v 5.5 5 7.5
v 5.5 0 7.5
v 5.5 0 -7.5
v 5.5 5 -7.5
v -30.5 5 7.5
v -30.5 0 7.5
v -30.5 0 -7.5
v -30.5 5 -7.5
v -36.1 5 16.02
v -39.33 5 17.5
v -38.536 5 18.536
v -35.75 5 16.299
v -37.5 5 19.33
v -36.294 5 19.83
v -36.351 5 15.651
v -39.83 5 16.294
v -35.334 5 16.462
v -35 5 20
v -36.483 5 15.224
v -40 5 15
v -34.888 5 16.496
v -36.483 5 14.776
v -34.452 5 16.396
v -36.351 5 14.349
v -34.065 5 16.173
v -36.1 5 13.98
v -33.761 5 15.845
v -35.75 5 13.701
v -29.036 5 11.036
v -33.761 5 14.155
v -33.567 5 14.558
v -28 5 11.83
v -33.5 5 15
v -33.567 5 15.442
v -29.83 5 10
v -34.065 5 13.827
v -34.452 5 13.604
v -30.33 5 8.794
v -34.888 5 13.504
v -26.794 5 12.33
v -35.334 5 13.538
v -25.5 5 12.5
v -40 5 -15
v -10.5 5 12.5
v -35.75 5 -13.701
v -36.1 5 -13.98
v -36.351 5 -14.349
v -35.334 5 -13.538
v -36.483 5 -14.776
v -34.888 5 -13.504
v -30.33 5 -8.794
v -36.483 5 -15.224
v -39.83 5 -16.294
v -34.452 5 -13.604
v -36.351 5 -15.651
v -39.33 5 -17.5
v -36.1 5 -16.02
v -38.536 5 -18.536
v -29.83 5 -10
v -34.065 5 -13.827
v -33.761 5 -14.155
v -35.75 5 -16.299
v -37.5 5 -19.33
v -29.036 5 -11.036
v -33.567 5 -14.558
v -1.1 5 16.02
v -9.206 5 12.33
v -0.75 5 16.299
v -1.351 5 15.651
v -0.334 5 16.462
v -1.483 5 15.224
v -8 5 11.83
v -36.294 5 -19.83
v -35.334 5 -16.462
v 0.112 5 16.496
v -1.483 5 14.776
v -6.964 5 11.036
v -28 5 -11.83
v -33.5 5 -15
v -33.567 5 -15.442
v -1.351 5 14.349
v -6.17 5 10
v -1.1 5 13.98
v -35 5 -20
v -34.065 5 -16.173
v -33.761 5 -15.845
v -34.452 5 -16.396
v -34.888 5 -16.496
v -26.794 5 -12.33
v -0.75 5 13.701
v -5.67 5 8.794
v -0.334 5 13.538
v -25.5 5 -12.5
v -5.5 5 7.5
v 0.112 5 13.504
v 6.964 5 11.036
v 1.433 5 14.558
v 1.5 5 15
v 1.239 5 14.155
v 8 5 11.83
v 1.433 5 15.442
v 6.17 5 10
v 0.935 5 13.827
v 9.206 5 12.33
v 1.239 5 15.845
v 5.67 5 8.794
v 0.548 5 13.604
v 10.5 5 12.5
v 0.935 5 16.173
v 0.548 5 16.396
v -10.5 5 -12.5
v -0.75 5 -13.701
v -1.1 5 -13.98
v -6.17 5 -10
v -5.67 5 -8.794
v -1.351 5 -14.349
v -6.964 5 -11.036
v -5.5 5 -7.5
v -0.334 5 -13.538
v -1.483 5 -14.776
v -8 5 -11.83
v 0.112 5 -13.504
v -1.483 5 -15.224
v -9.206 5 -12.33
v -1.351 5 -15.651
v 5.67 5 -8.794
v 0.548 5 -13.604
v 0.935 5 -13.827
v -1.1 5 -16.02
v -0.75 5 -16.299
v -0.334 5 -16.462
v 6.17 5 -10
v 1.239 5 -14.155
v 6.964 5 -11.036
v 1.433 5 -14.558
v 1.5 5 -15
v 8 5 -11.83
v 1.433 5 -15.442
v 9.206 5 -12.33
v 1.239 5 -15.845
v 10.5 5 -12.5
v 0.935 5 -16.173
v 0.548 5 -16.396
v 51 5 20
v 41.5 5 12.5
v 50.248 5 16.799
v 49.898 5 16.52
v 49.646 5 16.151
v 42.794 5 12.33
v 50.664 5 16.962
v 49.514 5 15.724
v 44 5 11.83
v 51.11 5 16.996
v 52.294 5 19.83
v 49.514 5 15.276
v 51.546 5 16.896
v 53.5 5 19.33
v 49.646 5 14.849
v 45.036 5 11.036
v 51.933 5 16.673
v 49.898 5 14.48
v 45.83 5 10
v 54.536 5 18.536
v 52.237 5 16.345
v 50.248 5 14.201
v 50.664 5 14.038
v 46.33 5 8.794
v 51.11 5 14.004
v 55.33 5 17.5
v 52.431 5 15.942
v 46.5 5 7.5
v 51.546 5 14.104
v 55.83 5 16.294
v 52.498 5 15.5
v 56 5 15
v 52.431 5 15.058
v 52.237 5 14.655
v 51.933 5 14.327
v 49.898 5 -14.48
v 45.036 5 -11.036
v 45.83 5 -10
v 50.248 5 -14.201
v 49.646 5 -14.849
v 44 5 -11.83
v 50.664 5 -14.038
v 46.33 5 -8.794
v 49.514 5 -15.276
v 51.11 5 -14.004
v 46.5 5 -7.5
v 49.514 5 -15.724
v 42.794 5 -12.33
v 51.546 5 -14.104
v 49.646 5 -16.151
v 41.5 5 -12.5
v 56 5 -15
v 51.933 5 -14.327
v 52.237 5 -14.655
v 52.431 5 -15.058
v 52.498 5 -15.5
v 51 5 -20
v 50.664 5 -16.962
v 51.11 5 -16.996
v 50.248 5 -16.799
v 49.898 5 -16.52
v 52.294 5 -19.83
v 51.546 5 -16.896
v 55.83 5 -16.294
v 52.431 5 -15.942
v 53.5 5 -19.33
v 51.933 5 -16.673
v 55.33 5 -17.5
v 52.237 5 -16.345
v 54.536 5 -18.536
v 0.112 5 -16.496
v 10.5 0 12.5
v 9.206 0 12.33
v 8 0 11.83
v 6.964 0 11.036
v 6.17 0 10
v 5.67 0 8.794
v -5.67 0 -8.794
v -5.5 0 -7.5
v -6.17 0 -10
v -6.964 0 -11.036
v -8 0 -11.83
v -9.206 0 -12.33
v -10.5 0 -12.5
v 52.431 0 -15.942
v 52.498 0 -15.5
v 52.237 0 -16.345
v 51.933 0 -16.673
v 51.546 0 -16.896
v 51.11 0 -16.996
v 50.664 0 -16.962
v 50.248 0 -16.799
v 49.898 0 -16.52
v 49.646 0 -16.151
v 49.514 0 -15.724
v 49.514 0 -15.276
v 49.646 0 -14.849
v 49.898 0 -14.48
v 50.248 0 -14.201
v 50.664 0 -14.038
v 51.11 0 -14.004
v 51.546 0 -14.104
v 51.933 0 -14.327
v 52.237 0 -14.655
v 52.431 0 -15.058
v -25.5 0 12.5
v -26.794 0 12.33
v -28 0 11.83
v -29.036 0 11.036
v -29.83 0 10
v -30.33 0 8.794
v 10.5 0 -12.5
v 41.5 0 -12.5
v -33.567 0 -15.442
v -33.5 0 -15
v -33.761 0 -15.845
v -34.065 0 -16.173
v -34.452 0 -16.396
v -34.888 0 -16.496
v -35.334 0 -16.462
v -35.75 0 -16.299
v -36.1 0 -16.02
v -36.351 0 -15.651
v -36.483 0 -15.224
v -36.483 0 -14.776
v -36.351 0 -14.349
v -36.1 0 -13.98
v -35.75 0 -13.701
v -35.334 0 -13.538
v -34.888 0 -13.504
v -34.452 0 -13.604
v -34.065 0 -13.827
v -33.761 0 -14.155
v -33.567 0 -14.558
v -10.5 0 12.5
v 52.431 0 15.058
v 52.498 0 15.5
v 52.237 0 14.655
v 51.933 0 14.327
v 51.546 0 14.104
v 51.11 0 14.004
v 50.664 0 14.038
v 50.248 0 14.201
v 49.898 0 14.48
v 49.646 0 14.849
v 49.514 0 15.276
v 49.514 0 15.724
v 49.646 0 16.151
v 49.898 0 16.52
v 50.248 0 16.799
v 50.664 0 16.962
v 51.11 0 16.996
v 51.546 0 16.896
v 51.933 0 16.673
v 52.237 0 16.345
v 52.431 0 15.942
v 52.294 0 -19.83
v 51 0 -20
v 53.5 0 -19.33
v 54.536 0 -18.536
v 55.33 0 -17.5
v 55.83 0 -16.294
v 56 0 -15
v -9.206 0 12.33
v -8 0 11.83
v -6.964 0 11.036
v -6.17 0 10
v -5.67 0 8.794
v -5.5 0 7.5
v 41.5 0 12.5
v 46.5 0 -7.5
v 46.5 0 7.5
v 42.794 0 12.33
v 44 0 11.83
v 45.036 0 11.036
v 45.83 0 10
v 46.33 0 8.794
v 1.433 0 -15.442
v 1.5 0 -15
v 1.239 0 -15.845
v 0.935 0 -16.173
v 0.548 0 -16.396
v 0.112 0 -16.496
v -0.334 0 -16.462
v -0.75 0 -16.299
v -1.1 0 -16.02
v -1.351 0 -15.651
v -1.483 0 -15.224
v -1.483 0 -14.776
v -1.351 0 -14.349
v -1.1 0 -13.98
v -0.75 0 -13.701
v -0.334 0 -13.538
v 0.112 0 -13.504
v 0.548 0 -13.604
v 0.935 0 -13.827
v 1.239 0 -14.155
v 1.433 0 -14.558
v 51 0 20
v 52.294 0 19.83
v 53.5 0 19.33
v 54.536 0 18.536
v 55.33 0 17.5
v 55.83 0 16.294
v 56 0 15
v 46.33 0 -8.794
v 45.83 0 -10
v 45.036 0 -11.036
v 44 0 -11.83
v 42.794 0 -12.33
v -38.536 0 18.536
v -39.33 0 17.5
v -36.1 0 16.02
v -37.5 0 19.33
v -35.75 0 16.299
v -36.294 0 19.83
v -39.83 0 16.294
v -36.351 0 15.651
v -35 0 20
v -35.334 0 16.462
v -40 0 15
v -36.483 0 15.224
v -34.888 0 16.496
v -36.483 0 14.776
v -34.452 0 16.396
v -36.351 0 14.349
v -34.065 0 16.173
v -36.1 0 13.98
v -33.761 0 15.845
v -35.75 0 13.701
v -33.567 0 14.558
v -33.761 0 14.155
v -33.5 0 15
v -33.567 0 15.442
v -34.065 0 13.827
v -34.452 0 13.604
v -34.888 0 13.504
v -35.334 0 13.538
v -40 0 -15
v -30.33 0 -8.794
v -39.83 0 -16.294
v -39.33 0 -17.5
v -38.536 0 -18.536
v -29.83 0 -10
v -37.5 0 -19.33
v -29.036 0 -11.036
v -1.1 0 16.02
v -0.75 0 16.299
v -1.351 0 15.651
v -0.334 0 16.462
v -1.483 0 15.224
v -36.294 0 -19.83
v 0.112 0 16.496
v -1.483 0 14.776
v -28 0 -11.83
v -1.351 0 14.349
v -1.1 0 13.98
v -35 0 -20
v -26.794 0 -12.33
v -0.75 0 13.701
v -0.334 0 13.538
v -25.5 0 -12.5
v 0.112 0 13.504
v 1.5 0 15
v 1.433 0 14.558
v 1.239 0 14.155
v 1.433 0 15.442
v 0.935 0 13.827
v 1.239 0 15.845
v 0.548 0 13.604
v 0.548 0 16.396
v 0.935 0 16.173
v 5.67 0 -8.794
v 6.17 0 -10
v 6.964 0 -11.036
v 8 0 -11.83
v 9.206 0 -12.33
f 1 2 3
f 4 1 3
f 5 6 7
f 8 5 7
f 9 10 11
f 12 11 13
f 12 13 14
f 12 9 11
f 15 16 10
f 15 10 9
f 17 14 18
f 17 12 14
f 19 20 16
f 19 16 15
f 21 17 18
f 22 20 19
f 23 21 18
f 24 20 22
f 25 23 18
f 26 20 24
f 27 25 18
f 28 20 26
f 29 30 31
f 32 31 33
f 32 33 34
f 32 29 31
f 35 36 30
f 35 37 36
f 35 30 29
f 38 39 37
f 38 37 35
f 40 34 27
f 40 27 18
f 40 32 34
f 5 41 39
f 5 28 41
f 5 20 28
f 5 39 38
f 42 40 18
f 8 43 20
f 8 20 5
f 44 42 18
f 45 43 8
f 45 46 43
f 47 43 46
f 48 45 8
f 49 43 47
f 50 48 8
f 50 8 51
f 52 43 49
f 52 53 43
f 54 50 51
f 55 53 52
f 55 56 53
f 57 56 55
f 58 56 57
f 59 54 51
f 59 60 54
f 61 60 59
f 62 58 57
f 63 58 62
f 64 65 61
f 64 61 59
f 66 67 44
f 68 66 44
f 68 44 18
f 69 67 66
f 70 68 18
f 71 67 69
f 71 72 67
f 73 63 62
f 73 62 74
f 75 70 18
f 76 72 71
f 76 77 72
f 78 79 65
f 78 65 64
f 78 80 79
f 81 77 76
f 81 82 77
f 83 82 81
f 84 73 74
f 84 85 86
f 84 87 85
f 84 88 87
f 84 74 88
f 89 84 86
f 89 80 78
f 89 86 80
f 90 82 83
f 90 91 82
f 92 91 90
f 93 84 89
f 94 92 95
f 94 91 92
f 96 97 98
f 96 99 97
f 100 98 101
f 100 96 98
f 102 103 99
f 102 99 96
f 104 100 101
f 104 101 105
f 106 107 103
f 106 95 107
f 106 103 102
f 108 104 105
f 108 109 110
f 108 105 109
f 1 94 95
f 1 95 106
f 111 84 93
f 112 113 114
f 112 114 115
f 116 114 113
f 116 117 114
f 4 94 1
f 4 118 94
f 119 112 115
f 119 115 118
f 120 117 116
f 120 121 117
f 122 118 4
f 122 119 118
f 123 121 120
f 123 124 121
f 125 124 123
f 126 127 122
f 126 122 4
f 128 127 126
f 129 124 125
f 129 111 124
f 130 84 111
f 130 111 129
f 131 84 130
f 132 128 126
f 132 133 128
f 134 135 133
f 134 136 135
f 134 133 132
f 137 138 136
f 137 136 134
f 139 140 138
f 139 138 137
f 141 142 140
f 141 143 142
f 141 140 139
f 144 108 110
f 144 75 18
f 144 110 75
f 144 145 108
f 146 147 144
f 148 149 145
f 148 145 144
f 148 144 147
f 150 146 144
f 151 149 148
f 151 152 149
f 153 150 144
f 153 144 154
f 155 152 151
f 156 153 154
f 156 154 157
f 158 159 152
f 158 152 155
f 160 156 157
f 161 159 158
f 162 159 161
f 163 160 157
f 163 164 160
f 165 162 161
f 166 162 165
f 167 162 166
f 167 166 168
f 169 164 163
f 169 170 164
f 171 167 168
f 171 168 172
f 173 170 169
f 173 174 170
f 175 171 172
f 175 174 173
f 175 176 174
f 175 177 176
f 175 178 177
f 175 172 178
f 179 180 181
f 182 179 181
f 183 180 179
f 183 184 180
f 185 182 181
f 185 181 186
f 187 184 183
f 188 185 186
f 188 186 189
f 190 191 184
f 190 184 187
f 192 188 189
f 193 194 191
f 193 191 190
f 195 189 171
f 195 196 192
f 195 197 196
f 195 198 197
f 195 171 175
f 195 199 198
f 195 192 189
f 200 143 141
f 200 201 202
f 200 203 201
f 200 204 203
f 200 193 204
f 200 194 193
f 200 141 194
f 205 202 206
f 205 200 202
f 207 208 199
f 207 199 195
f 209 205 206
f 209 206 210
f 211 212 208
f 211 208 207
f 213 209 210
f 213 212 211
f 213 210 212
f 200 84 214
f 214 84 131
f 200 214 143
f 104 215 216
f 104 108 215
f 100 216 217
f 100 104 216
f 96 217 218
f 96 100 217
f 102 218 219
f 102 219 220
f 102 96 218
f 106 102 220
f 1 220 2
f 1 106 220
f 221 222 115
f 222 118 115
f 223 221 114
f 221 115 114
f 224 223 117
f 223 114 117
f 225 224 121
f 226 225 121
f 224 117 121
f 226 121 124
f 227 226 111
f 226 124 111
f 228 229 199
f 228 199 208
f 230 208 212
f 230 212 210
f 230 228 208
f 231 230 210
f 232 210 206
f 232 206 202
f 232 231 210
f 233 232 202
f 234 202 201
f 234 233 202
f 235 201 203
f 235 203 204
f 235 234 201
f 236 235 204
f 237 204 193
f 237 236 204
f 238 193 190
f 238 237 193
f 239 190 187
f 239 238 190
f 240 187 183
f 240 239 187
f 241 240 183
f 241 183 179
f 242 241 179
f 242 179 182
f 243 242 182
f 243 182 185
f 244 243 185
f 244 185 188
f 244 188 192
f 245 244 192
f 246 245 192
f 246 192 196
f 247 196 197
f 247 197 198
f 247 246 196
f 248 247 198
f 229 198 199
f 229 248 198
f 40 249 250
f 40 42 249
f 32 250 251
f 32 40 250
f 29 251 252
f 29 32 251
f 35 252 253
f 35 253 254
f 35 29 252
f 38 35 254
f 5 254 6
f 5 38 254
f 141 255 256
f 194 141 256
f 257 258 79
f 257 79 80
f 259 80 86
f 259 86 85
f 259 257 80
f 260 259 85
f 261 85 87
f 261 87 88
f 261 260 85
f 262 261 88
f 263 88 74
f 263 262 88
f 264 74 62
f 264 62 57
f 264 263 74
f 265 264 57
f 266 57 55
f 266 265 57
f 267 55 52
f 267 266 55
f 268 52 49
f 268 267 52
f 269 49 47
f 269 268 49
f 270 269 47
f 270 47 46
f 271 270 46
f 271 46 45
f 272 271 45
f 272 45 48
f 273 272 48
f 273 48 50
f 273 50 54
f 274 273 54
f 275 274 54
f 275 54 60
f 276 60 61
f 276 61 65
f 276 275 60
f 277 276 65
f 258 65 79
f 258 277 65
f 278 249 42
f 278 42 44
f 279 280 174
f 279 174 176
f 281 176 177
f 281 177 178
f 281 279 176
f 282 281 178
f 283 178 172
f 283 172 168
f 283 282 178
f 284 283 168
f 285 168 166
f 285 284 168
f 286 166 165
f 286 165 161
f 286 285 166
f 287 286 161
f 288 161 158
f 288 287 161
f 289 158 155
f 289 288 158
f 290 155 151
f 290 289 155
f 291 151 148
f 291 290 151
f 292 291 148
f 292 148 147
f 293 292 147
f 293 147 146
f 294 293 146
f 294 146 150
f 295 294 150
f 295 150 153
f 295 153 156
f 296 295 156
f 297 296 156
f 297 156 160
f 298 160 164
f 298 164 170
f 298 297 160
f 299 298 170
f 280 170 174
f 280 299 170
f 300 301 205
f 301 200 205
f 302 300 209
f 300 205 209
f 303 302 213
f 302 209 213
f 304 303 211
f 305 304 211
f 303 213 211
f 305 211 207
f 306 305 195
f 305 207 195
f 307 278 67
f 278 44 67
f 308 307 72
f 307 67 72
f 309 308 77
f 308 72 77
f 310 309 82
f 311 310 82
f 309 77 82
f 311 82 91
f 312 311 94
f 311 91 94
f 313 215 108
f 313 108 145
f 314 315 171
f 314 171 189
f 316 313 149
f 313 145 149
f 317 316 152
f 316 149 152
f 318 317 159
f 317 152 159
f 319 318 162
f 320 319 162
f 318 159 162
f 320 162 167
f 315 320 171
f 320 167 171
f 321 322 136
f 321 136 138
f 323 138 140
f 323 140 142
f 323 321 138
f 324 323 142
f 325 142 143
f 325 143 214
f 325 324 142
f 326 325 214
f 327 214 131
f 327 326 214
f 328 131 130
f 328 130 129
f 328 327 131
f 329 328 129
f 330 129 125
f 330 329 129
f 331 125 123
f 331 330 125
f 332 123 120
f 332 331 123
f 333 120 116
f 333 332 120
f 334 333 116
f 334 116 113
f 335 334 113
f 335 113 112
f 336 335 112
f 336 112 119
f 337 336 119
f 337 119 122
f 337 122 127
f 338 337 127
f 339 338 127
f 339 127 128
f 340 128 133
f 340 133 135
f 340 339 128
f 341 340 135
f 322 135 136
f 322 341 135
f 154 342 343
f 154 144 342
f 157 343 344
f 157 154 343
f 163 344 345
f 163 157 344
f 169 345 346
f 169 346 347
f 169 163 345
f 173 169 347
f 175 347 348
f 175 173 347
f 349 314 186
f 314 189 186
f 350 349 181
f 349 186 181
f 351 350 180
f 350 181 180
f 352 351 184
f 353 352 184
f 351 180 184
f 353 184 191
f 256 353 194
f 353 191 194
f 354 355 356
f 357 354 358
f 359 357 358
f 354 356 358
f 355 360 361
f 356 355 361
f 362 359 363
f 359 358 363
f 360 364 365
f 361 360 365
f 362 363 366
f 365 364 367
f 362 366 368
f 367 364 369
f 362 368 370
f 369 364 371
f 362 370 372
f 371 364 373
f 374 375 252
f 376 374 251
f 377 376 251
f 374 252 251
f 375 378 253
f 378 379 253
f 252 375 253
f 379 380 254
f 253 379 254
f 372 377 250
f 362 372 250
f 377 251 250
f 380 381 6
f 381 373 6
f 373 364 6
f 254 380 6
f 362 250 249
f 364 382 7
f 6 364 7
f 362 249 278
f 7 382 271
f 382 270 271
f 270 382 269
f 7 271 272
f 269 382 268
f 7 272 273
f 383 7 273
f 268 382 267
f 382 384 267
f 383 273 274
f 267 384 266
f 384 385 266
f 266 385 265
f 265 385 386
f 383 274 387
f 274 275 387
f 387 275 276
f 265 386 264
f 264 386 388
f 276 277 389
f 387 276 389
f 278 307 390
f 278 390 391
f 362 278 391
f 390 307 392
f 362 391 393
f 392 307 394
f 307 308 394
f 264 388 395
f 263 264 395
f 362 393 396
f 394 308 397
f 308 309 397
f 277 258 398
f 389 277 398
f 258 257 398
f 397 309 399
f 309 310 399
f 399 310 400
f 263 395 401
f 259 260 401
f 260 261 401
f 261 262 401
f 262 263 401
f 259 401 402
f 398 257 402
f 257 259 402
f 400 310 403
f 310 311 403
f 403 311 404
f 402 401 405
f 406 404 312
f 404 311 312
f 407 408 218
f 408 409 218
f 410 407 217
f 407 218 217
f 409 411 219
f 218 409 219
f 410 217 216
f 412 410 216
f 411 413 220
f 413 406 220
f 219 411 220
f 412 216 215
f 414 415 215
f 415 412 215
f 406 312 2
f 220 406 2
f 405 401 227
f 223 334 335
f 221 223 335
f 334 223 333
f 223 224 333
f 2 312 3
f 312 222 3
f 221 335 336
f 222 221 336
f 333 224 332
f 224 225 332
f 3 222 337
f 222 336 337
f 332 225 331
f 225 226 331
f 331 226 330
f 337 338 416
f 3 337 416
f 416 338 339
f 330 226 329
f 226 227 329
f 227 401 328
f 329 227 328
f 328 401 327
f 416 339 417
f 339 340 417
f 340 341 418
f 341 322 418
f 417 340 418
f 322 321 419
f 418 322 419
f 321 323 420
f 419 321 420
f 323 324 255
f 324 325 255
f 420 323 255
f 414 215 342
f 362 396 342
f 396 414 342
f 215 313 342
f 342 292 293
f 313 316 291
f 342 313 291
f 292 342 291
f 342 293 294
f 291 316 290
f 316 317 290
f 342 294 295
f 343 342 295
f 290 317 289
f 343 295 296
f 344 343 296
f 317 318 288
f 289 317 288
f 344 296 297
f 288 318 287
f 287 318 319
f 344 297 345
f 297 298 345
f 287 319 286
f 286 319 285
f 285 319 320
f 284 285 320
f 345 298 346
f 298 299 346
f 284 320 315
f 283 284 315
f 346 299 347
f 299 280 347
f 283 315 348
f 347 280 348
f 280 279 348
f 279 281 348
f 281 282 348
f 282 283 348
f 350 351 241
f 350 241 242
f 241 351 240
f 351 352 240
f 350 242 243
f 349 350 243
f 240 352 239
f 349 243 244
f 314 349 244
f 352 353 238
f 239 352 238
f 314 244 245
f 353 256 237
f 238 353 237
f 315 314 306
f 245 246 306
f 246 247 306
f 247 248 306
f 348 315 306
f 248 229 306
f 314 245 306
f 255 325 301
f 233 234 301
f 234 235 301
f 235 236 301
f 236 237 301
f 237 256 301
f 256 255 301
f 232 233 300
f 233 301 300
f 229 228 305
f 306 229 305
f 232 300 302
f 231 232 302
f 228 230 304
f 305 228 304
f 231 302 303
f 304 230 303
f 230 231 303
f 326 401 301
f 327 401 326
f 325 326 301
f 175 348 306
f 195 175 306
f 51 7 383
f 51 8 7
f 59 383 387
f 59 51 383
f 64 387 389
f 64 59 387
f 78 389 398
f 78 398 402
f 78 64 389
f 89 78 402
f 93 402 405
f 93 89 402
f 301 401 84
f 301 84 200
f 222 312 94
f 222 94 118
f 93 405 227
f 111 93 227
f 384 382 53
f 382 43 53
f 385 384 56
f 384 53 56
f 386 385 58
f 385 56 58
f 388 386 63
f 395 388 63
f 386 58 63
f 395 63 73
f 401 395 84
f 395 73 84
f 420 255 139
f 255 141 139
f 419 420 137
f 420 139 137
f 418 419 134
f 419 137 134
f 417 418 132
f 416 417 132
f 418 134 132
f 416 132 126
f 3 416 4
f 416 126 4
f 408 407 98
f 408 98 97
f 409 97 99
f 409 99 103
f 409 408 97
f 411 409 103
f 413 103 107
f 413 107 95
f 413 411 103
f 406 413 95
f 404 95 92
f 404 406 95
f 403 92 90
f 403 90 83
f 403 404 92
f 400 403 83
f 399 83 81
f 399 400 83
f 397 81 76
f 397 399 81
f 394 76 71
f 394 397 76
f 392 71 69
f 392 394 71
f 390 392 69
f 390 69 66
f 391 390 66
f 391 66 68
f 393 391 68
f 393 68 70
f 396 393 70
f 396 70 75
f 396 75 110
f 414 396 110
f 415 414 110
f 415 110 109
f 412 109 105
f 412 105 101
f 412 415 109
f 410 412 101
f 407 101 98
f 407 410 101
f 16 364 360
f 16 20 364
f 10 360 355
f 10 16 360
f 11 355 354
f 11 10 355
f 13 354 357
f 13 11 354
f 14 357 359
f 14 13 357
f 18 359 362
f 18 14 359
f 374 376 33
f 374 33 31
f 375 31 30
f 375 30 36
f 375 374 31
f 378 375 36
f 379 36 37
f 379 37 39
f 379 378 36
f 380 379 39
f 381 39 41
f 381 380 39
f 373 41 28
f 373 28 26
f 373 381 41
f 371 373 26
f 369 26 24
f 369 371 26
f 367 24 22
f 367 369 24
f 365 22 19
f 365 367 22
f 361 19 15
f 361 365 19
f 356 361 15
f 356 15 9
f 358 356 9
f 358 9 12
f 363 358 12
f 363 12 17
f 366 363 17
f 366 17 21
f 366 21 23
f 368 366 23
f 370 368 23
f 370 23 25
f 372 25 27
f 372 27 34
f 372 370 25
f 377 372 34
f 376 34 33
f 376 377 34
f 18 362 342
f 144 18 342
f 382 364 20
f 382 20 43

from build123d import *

# Parameters (mm, degrees)
SKETCH1_W           = 96
SKETCH1_H           = 40
SKETCH1_R           = 1.5
SKETCH1_W_2         = 25
SKETCH1_H_2         = 25
SKETCH1_W_3         = 41
BOSS_EXTRUDE1_DEPTH = 5
FILLET1_R           = 5


with BuildPart() as part:
    # Sketch1 → Boss-Extrude1 (new body)
    with BuildSketch(Plane(origin=(0, 0, 0), x_dir=(1, 0, 0), z_dir=(0, 1, 0))):
        with Locations((8, 0)):
            Rectangle(SKETCH1_W, SKETCH1_H)
        with Locations((-35, 15)):
            Circle(SKETCH1_R, mode=Mode.SUBTRACT)
        with Locations((0, 15)):
            Circle(SKETCH1_R, mode=Mode.SUBTRACT)
        with Locations((50.997548961, -15.5)):
            Circle(SKETCH1_R, mode=Mode.SUBTRACT)
        with Locations((50.997548961, 15.5)):
            Circle(SKETCH1_R, mode=Mode.SUBTRACT)
        with Locations((-35, -15)):
            Circle(SKETCH1_R, mode=Mode.SUBTRACT)
        with Locations((0, -15)):
            Circle(SKETCH1_R, mode=Mode.SUBTRACT)
        with Locations((-18, 0)):
            Rectangle(SKETCH1_W_2, SKETCH1_H_2, mode=Mode.SUBTRACT)
        with Locations((26, 0)):
            Rectangle(SKETCH1_W_3, SKETCH1_H_2, mode=Mode.SUBTRACT)
    extrude(amount=BOSS_EXTRUDE1_DEPTH)

    # Fillet1
    fillet1_edges = [part.edges().sort_by_distance(p)[0] for p in [
        (-5.5, 2.5, 12.5),
        (-5.5, 2.5, -12.5),
        (-30.5, 2.5, -12.5),
        (-30.5, 2.5, 12.5),
        (-40, 2.5, 20),
        (-40, 2.5, -20),
        (56, 2.5, -20),
        (56, 2.5, 20),
        (46.5, 2.5, 12.5),
        (46.5, 2.5, -12.5),
        (5.5, 2.5, -12.5),
        (5.5, 2.5, 12.5),
    ]]
    fillet(fillet1_edges, radius=FILLET1_R)


solid = part.part
